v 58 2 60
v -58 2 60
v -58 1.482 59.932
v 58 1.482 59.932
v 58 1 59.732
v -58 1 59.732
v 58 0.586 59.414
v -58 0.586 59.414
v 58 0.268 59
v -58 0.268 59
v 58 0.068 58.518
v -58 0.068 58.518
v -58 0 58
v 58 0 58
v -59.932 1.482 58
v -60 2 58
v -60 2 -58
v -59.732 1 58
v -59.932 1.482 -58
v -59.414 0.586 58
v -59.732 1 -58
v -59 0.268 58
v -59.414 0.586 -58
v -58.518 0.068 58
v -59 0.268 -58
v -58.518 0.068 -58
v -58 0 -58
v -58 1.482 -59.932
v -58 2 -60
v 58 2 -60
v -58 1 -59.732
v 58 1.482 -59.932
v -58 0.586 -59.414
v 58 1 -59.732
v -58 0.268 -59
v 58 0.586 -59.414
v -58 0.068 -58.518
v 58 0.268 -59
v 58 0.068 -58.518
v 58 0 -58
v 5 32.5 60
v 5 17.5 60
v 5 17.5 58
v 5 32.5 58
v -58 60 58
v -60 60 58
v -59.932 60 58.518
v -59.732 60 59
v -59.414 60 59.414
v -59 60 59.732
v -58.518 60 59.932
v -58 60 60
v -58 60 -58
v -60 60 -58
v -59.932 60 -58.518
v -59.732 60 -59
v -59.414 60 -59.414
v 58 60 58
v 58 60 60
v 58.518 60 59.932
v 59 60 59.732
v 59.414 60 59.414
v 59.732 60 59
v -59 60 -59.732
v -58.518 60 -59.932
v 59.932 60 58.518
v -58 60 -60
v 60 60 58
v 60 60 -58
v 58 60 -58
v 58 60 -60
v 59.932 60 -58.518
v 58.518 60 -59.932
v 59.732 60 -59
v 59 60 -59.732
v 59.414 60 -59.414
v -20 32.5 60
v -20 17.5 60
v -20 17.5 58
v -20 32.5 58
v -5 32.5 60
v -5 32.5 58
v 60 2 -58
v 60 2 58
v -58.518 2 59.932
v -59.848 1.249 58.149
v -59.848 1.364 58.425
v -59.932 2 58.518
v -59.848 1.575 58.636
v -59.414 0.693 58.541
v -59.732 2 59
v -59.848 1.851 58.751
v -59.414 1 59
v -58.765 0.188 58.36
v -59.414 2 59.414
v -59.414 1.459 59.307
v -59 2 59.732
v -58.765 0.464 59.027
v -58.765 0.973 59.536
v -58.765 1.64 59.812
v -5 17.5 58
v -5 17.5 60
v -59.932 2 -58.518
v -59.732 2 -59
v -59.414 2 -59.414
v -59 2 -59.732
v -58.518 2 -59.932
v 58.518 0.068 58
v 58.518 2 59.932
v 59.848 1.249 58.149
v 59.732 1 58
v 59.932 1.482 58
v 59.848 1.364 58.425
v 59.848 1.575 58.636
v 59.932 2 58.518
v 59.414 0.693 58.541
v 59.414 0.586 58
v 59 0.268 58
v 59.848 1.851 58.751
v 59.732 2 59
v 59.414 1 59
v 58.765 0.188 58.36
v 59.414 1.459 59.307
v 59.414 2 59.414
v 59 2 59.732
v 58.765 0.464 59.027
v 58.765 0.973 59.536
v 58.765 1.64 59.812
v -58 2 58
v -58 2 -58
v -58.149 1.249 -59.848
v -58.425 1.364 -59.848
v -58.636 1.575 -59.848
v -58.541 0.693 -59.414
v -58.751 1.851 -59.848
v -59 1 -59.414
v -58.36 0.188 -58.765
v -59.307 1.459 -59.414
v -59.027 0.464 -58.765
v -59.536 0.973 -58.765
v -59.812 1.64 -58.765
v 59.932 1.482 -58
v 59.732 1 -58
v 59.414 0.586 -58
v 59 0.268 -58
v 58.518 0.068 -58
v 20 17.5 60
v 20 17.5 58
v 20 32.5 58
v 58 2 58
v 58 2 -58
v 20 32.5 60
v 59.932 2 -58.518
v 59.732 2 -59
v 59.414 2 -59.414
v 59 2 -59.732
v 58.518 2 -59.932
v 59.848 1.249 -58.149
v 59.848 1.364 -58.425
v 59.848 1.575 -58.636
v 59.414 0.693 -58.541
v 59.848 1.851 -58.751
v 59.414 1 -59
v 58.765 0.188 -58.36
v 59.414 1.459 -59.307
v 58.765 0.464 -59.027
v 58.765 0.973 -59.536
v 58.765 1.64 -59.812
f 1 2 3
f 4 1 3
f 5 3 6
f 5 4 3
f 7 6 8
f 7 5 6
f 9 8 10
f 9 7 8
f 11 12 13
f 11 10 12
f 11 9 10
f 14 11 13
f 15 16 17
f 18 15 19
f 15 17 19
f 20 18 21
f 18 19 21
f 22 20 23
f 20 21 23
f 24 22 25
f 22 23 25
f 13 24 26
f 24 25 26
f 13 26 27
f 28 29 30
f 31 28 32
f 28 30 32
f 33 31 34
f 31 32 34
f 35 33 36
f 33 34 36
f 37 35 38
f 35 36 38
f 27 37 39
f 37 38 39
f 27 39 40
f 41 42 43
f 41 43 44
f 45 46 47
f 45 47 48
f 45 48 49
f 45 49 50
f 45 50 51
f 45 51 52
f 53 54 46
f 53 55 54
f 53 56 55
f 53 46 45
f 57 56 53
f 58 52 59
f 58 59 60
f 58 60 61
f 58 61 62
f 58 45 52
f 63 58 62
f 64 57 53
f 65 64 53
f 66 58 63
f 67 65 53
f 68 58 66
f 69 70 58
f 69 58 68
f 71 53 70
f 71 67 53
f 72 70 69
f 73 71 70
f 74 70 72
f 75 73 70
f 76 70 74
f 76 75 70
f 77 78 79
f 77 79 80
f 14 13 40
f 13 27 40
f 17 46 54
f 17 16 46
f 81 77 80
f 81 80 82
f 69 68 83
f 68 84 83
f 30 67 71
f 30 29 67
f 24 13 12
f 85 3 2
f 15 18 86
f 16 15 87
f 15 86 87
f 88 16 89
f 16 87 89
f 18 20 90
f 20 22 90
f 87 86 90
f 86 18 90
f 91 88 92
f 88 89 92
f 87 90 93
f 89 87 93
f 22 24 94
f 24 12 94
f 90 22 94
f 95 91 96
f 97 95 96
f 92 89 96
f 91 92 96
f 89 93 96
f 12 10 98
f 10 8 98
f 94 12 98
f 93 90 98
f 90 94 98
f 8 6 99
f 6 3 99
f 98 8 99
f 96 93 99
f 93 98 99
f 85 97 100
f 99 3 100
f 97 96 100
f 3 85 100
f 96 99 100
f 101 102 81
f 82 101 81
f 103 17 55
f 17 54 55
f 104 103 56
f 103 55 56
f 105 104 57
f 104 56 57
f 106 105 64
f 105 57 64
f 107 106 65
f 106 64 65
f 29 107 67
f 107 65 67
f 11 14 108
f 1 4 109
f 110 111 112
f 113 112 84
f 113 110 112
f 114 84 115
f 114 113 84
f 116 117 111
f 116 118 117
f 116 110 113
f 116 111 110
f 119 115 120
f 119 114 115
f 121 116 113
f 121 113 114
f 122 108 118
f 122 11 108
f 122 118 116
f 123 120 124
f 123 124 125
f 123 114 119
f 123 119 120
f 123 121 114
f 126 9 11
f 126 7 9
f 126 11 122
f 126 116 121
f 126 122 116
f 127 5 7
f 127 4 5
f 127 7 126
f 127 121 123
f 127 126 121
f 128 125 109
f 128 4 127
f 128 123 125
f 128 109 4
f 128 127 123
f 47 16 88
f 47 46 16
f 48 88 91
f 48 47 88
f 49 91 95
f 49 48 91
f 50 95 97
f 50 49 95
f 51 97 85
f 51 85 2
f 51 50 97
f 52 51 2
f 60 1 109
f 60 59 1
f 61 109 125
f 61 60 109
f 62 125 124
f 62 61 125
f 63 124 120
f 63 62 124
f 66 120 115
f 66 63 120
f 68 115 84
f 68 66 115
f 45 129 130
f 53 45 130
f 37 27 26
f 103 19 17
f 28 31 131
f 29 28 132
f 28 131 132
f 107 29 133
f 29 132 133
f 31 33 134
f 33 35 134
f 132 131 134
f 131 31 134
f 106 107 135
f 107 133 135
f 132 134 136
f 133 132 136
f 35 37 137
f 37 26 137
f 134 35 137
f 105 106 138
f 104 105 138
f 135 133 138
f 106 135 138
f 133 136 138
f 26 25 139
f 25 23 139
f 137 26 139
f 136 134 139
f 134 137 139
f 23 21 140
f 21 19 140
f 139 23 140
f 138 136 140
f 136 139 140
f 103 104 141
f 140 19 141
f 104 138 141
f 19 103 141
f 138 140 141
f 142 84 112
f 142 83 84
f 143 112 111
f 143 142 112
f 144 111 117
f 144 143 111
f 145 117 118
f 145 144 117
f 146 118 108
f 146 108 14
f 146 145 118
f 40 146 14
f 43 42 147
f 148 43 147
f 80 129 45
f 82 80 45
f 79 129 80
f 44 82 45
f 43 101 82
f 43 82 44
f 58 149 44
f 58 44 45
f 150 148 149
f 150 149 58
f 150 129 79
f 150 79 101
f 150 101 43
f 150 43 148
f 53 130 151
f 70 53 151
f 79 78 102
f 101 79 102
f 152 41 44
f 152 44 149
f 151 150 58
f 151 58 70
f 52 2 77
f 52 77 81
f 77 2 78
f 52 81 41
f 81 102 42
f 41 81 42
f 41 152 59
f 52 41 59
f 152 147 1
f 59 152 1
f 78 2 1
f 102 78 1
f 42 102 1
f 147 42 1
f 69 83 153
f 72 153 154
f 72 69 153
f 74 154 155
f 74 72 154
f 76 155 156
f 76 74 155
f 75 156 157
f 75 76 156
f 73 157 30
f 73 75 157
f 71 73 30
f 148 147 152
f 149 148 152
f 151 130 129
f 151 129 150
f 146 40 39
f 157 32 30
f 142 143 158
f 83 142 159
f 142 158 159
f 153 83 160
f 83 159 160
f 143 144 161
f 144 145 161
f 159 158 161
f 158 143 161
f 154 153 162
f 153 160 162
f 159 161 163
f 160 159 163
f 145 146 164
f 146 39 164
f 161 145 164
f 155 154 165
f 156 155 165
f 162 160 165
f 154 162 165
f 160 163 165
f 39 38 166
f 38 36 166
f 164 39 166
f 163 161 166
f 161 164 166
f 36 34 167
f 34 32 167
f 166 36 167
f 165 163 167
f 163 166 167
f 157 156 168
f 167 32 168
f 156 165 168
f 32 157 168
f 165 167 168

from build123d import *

# Parameters (mm, degrees)
SKETCH1_W           = 120
SKETCH1_H           = 120
BOSS_EXTRUDE1_DEPTH = 60
SHELL1_T            = -2
FILLET1_R           = 2
CUT_EXTRUDE1_REACH  = 148.969
SKETCH2_W           = 15
SKETCH2_H           = 15


with BuildPart() as part:
    # Sketch1 → Boss-Extrude1 (new body)
    with BuildSketch(Plane(origin=(0, 0, 0), x_dir=(1, 0, 0), z_dir=(0, 1, 0))):
        Rectangle(SKETCH1_W, SKETCH1_H)
    extrude(amount=BOSS_EXTRUDE1_DEPTH)

    # Shell1
    shell1_openings = [part.faces().sort_by_distance(p)[0] for p in [
        (0, 60, 0),
    ]]
    offset(amount=SHELL1_T, openings=shell1_openings, kind=Kind.INTERSECTION)

    # Fillet1
    fillet1_edges = [part.edges().sort_by_distance(p)[0] for p in [
        (0, 0, 60),
        (-60, 0, 0),
        (0, 0, -60),
        (60, 0, 0),
        (60, 30, 60),
        (-60, 30, 60),
        (-60, 30, -60),
        (60, 30, -60),
    ]]
    fillet(fillet1_edges, radius=FILLET1_R)

    # Sketch2 → Cut-Extrude1 (cut, up to next)
    with BuildSketch(Plane.XY.offset(60), mode=Mode.PRIVATE) as cut_extrude1_sk1:
        with Locations((-12.5, 25)):
            Rectangle(SKETCH2_W, SKETCH2_H)
    cut_extrude1_tool1 = extrude(cut_extrude1_sk1.sketch, amount=-CUT_EXTRUDE1_REACH, mode=Mode.PRIVATE) & part.part
    # Sketch2 → Cut-Extrude1 (cut, up to next)
    with BuildSketch(Plane.XY.offset(60), mode=Mode.PRIVATE) as cut_extrude1_sk2:
        with Locations((12.5, 25)):
            Rectangle(SKETCH2_W, SKETCH2_H)
    cut_extrude1_tool2 = extrude(cut_extrude1_sk2.sketch, amount=-CUT_EXTRUDE1_REACH, mode=Mode.PRIVATE) & part.part
    add(cut_extrude1_tool1.solids().sort_by_distance((-12.5, 25, 60))[0], mode=Mode.SUBTRACT)
    add(cut_extrude1_tool2.solids().sort_by_distance((12.5, 25, 60))[0], mode=Mode.SUBTRACT)


solid = part.part
